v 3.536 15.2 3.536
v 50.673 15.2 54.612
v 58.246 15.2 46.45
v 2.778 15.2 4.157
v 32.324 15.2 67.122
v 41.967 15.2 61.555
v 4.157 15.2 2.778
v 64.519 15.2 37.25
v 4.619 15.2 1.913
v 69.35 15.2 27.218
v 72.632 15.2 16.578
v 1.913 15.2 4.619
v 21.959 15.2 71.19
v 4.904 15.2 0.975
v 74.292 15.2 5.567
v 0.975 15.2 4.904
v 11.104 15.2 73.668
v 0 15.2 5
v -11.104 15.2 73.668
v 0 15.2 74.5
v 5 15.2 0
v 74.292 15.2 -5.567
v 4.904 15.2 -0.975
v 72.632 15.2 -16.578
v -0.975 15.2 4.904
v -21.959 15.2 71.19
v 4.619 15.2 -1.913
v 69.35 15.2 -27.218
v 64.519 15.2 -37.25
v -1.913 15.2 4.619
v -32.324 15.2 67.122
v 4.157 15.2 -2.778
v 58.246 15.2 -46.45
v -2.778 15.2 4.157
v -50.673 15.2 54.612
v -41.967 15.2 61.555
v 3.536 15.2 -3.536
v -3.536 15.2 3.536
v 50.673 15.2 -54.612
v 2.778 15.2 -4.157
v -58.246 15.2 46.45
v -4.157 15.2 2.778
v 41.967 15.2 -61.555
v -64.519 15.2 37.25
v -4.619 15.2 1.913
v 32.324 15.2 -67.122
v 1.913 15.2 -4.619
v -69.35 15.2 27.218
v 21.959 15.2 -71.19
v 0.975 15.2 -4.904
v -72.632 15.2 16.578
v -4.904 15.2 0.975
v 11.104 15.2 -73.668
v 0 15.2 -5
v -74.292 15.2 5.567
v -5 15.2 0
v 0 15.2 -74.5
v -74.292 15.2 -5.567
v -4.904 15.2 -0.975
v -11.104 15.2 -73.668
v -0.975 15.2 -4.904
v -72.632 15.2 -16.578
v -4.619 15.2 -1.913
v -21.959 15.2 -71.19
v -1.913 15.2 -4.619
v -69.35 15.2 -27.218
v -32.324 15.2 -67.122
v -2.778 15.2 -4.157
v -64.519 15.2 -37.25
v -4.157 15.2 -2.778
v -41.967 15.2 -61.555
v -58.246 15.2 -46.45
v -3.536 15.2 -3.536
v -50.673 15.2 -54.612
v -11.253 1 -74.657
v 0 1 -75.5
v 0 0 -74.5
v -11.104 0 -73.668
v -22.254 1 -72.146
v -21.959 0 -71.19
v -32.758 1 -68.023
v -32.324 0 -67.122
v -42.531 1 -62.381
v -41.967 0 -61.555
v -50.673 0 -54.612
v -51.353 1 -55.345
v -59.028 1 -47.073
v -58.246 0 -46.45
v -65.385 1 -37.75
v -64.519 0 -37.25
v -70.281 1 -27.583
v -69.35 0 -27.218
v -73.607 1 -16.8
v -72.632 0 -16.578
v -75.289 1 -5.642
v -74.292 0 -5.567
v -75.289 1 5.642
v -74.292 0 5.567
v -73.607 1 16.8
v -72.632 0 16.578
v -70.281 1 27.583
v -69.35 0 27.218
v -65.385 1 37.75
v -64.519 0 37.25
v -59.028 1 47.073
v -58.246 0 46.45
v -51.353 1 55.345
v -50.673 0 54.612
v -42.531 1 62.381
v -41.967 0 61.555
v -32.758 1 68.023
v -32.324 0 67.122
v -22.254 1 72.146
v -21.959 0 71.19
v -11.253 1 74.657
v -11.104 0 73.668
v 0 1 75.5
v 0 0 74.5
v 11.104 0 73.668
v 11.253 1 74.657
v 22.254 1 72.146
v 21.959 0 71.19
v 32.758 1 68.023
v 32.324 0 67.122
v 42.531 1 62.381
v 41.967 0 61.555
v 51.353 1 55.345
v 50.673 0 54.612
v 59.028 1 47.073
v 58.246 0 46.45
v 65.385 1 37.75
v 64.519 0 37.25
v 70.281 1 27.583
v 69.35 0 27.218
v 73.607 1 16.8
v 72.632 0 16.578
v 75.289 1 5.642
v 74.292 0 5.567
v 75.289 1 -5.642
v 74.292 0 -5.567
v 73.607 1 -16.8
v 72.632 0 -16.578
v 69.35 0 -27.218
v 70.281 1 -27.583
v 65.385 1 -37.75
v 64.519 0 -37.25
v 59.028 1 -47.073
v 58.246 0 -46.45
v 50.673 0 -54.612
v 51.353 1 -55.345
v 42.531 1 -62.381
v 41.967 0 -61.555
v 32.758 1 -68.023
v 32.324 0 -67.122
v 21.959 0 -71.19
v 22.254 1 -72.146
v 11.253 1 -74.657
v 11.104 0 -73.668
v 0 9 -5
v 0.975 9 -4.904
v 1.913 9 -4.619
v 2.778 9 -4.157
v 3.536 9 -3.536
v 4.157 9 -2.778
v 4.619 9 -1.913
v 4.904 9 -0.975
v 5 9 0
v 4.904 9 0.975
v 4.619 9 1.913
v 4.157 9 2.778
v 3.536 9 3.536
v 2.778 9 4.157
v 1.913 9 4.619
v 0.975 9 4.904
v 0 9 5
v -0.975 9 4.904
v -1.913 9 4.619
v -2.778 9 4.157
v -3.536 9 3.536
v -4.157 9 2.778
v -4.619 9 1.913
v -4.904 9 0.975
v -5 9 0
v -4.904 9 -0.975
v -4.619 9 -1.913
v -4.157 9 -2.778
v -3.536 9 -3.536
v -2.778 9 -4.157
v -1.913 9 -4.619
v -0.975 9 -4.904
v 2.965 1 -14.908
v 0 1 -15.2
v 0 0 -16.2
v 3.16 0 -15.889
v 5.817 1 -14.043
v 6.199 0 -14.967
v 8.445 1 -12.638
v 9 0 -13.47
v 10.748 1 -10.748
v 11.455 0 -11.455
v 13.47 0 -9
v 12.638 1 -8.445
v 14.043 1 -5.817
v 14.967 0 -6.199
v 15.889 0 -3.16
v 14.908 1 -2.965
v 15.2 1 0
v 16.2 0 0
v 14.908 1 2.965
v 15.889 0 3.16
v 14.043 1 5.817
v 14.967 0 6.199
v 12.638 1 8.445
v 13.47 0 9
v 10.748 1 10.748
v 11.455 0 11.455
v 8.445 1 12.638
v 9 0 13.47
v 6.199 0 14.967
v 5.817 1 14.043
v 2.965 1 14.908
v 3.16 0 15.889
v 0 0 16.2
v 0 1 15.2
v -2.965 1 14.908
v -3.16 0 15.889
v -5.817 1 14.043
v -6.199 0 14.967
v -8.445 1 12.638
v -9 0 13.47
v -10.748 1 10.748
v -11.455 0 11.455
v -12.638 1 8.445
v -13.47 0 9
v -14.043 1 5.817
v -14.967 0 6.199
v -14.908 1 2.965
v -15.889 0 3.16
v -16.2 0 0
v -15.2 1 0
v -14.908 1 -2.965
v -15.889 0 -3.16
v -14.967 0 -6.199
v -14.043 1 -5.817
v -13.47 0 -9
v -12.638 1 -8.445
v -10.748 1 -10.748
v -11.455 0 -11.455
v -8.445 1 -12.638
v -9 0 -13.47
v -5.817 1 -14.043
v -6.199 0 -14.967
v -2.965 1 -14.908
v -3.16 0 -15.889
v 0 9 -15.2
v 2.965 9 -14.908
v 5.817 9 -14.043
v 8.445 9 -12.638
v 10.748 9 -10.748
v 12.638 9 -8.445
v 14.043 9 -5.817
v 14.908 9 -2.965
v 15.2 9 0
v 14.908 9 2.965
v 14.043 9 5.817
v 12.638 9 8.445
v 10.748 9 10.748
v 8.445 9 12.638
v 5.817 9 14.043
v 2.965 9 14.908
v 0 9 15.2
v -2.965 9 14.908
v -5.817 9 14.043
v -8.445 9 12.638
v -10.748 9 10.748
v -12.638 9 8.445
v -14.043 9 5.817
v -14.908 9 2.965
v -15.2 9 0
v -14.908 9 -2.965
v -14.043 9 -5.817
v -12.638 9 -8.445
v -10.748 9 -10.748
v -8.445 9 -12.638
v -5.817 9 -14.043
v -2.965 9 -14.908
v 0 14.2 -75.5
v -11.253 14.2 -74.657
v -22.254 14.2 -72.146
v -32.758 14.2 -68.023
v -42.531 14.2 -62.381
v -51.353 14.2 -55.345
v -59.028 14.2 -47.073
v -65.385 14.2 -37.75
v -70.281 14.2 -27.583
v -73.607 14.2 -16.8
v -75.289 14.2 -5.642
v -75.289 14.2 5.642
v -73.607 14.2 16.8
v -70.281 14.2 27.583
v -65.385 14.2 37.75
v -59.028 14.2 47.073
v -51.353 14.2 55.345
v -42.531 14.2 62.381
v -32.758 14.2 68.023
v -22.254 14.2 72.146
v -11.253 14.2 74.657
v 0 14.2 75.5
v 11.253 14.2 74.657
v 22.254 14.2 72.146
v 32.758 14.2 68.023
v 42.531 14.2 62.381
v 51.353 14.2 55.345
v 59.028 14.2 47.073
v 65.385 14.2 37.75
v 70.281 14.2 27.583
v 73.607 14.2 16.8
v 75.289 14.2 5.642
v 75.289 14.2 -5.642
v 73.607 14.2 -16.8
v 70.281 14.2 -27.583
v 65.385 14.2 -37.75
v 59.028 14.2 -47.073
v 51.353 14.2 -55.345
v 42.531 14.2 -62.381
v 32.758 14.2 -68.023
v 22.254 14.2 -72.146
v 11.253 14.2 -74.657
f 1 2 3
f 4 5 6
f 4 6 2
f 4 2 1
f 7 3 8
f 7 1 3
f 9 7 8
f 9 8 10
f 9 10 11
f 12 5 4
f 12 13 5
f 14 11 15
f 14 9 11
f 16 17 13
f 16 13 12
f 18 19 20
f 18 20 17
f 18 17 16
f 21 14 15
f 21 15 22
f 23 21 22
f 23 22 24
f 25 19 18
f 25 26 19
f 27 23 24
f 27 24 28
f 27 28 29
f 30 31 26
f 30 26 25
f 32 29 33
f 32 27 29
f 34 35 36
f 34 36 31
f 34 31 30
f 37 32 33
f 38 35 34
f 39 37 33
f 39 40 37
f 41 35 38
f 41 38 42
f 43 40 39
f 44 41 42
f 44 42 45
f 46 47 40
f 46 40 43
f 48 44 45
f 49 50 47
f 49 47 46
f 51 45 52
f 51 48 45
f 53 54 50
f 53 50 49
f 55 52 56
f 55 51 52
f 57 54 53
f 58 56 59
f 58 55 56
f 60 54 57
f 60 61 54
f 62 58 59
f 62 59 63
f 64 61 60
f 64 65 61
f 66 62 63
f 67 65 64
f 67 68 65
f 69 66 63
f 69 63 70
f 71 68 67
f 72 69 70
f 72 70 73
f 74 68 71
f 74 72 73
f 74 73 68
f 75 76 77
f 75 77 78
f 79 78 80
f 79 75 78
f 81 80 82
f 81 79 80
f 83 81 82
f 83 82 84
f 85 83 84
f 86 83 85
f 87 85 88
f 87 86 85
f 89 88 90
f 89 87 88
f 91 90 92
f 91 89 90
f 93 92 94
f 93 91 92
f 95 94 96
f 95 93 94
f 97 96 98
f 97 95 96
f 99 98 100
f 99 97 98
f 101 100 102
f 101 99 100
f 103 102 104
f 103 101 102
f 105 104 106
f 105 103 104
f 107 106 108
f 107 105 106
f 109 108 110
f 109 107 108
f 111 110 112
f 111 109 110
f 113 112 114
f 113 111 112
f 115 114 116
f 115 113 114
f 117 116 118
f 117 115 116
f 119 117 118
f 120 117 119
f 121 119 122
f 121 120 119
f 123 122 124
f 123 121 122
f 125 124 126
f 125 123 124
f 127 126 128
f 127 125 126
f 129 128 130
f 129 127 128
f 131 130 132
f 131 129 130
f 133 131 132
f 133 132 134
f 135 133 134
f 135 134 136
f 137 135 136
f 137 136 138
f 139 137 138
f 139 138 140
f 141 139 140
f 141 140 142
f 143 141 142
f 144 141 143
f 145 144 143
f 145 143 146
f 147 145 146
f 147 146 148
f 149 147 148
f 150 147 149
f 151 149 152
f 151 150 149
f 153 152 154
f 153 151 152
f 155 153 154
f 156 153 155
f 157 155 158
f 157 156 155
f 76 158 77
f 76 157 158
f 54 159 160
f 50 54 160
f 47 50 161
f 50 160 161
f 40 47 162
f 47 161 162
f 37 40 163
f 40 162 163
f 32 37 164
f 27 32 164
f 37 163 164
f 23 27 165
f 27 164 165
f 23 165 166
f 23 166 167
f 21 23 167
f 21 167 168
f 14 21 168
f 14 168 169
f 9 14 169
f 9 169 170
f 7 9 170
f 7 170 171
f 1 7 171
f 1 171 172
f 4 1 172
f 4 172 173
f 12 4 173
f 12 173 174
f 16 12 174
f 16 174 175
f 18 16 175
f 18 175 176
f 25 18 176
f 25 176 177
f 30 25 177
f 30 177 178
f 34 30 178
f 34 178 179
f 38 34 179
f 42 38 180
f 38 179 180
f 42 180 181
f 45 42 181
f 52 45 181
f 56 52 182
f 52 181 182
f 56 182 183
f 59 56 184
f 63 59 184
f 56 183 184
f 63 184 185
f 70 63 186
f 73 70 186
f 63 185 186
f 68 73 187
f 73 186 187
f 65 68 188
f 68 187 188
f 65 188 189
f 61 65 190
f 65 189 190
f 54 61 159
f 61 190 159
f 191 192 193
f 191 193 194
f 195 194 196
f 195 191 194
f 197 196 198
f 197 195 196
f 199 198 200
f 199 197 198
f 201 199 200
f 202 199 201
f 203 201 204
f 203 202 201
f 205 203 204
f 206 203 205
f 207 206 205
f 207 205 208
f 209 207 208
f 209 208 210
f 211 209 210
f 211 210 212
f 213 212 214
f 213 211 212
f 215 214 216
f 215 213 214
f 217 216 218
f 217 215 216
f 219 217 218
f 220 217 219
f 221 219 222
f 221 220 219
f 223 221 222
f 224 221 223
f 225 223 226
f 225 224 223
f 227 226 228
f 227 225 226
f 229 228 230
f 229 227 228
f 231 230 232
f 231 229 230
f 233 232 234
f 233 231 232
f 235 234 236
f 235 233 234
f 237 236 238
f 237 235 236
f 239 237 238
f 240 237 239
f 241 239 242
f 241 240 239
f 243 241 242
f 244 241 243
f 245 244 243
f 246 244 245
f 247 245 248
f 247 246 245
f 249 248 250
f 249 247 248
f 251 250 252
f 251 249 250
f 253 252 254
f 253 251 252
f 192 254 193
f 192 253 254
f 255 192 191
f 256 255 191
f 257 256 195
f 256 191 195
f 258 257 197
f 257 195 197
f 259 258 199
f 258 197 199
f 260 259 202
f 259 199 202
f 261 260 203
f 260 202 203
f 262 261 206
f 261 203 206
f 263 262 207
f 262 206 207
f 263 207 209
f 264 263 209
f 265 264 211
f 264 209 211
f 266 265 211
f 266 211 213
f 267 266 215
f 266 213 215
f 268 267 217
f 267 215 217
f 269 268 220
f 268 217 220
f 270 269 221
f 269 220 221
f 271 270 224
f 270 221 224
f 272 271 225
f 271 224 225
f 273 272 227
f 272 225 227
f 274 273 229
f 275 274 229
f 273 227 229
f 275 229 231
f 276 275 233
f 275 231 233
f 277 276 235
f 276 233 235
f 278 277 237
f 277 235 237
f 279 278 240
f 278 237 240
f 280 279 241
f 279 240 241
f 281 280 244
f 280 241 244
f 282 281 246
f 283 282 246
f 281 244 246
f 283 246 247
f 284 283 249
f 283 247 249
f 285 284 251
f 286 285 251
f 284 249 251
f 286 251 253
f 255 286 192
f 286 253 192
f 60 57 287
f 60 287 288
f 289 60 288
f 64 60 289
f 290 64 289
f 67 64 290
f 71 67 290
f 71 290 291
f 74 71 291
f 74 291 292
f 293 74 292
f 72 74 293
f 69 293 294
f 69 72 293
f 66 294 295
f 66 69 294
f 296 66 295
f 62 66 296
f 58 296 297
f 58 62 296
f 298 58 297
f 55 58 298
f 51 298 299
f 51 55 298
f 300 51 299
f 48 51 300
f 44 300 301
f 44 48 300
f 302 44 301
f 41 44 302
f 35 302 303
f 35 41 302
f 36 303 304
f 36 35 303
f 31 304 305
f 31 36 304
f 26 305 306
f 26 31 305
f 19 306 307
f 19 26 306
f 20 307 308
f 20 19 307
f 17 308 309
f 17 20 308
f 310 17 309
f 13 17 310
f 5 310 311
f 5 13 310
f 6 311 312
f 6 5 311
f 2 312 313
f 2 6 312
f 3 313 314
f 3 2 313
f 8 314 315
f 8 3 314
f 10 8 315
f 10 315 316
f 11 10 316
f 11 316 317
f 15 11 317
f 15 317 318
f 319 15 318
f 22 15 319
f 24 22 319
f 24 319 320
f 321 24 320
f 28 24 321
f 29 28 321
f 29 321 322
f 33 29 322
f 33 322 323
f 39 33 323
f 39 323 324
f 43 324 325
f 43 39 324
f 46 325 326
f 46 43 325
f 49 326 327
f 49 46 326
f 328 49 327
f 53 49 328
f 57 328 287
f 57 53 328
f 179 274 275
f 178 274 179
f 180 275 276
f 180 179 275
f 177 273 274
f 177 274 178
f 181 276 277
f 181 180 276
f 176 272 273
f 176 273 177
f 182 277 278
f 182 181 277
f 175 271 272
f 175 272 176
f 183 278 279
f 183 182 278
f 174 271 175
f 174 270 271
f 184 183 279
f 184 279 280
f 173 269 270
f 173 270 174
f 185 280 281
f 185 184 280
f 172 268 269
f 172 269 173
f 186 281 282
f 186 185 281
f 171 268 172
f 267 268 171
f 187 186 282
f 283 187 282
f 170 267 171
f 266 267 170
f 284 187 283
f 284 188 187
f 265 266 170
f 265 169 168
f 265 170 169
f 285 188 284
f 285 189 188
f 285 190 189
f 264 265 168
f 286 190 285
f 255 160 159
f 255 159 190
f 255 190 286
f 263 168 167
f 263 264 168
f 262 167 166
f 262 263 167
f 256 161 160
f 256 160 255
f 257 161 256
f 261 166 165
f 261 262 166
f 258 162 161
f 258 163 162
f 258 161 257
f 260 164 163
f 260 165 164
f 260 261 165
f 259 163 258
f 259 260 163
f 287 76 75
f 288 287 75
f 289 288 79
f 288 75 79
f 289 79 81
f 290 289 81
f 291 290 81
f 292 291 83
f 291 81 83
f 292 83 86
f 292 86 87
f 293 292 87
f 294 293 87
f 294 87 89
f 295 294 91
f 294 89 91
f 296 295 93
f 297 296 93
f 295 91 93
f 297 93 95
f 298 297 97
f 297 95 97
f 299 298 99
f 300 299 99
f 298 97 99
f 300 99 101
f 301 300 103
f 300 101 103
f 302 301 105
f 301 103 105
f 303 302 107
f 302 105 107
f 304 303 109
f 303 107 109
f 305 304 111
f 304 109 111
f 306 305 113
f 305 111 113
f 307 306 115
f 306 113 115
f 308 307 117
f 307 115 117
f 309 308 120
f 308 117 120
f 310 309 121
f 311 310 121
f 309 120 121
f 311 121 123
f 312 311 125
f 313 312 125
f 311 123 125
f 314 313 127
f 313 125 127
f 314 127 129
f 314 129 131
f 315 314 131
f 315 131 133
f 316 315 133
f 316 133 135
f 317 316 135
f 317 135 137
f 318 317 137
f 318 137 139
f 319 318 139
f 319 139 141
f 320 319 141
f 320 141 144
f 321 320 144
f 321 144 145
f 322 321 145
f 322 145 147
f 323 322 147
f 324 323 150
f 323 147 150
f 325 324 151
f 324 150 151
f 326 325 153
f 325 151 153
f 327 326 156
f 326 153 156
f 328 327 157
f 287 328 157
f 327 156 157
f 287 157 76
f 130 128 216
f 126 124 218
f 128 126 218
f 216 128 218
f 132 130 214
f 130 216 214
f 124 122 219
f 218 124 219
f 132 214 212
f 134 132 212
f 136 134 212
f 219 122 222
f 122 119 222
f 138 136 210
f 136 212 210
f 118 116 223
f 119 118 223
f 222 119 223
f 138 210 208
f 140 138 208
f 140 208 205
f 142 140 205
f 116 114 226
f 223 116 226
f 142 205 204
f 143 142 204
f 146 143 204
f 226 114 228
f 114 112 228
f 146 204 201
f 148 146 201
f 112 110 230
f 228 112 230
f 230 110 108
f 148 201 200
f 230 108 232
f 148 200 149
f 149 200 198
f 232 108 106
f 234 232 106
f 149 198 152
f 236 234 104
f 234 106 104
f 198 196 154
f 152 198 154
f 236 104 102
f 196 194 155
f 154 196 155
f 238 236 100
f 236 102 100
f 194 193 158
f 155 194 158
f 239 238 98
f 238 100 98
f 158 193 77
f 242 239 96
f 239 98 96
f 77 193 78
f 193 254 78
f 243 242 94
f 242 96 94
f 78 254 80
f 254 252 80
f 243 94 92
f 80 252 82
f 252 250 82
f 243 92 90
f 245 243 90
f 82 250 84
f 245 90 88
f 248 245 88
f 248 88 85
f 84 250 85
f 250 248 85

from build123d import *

# Parameters (mm, degrees)
SKETCH1_R           = 75.5
BOSS_EXTRUDE1_DEPTH = 15.2
SKETCH2_R           = 15.2
CUT_EXTRUDE1_DEPTH  = 9
CHAMFER1_SIZE       = 1
SKETCH4_R           = 5
CUT_EXTRUDE2_DEPTH  = 28
CHAMFER2_SIZE       = 1


with BuildPart() as part:
    # Sketch1 → Boss-Extrude1 (new body)
    with BuildSketch(Plane(origin=(0, 0, 0), x_dir=(1, 0, 0), z_dir=(0, 1, 0))):
        with Locations(Location((0, 0, 0), (0, 0, 90))):
            Circle(SKETCH1_R)
    extrude(amount=BOSS_EXTRUDE1_DEPTH)

    # Sketch2 → Cut-Extrude1 (cut)
    with BuildSketch(Plane.XZ):
        with Locations(Location((0, 0, 0), (0, 0, 270))):
            Circle(SKETCH2_R)
    extrude(amount=-CUT_EXTRUDE1_DEPTH, mode=Mode.SUBTRACT)

    # Chamfer1
    chamfer1_edges = [part.edges().sort_by_distance(p)[0] for p in [
        (0, 0, 15.2),
    ]]
    chamfer(chamfer1_edges, length=CHAMFER1_SIZE)

    # Sketch4 → Cut-Extrude2 (cut)
    with BuildSketch(Plane.XZ.offset(-9)):
        with Locations(Location((0, 0, 0), (0, 0, 270))):
            Circle(SKETCH4_R)
    extrude(amount=-CUT_EXTRUDE2_DEPTH, mode=Mode.SUBTRACT)

    # Chamfer2
    chamfer2_edges = [part.edges().sort_by_distance(p)[0] for p in [
        (0, 0, 75.5),
        (0, 15.2, 75.5),
    ]]
    chamfer(chamfer2_edges, length=CHAMFER2_SIZE)


solid = part.part
